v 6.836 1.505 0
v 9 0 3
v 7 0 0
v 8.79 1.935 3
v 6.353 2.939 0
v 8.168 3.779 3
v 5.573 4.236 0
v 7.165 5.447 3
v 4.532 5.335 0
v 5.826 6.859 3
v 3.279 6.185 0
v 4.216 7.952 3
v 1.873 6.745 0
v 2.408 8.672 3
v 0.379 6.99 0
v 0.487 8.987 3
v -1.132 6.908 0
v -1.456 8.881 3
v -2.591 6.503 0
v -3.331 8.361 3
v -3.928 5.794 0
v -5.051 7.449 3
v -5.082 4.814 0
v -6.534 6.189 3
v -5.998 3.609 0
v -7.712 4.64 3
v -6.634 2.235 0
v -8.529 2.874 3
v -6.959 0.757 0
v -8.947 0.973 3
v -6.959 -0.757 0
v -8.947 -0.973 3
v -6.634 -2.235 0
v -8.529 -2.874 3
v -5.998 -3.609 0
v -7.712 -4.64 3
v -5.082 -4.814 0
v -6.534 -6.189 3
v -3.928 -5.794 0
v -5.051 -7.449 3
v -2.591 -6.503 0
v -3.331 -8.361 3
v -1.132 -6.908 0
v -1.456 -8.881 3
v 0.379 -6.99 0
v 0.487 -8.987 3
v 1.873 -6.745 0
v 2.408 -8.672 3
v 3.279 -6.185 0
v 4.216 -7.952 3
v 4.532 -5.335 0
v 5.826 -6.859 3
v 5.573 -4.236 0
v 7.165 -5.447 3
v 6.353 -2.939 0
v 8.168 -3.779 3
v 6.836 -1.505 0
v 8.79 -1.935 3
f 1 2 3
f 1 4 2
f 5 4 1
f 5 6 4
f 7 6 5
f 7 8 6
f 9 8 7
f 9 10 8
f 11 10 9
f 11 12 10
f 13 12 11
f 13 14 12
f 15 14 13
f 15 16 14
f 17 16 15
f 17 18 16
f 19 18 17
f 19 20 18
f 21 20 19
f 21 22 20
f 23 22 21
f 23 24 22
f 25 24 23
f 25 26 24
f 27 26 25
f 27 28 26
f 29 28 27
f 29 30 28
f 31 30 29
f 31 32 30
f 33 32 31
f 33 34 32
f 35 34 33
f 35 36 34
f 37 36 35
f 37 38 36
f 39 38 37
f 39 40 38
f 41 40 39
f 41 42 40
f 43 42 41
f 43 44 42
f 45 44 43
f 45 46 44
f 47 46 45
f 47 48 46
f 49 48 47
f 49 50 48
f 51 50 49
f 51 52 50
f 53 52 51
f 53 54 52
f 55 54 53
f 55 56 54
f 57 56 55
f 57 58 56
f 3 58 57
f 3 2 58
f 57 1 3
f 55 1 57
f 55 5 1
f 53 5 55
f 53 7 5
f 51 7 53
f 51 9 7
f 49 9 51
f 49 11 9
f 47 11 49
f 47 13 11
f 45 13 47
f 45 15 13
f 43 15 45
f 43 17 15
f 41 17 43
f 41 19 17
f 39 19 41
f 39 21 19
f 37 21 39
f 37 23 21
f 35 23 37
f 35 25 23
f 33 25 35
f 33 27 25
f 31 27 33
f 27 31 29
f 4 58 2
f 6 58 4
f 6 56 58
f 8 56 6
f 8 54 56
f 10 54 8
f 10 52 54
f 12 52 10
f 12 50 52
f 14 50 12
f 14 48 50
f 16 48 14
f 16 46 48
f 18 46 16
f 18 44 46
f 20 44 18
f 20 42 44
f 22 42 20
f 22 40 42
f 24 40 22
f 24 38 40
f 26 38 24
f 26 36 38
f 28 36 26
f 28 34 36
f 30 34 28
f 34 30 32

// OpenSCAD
// Generated by SolidPython 1.0.1 on 2020-07-29 00:02:42


cylinder(h = 3, r1 = 7, r2 = 9);
/***********************************************
*********      SolidPython code:      **********
************************************************
 
# import packages: SolidPython
from solid import *
from solid.utils import *
from itertools import chain, combinations


class Resize:

    def __init__(self, scad_file):
        self.scad_file = scad_file
        #self.scad_file = import_scad(scad_file)
        # cone/cylinder param:
        self.r1 = 0
        self.r2 = 0
        self.h = 0
        # rectangular prism param:
        self.w = 0
        self.l = 0
        # ellipse param:
        self.r = 0

    # import OpenScad code (file name corresponds to shape)


    # classify shape + parameters
    def assign(self, param1, param2, param3):
        if self.scad_file == 'cone.scad':
            self.r1 = param1
            self.r2 = param2
            self.h = param3
        elif self.scad_file == 'cylinder.scad':
            self.r1 = param1
            self.r2 = param2
            self.h = param3
        elif self.scad_file == 'rectangularPrism.scad':
            self.h = param1
            self.l = param2
            self.w = param3
        else:
            self.r = param1
            self.h = param2

    # resize parameters
    def iterate(self):
        x = range(3, 20, 2)
        i = 1
        if self.scad_file == 'cone.scad':
            tempList = list(combinations(x, 3))
            #print(tempList)
            for i in x:
                for j in range (3):
                    param1 = tempList[i][0]
                    param2 = tempList[i][1]
                    param3 = tempList[i][2]
                    filepath = 'produced_scad_files/' + 'cone' + str(param1) + '_' + str(param2) + '_' + str(param3) + '.scad'
                    scad_render_to_file(cylinder(h=param1, r1=param2, r2=param3), filepath)

        elif self.scad_file == 'cylinder.scad':
            tempList = list(combinations(x, 3))
            for i in x:
                for j in range(3):
                    param1 = tempList[i][0]
                    param2 = tempList[i][1]
                    param3 = tempList[i][2]
                    filepath = 'produced_scad_files/' + 'cylinder' + str(param1) + '_' + str(param2) + '_' + str(param3) + '.scad'
                    scad_render_to_file(cylinder(h=param1, r1=param2, r2=param3), filepath)

        elif self.scad_file == 'rectangularPrism.scad':
            tempList = list(combinations(x, 3))
            for i in x:
                for j in range(3):
                    param1 = tempList[i][0]
                    param2 = tempList[i][1]
                    param3 = tempList[i][2]
                    filepath = 'produced_scad_files/' + 'rectangularPrism' + str(param1) + '_' + str(param2) + '_' + str(
                        param3) + '.scad'
                    scad_render_to_file(cube(size=(param1, param2, param3)), filepath)

        else:
            tempList = list(combinations(x, 2))
            for i in x:
                for j in range(3):
                    param1 = tempList[i][0]
                    param2 = tempList[i][1]
                    filepath = 'produced_scad_files/' + 'ellipse' + str(param1) + '_' + str(param2) + '_' + '.scad'
                    scad_render_to_file(sphere(param1, param2), filepath)

    def render_to_scadfile(self):
        scad_render_to_file(scad, 'example.scad') 
 
************************************************/
